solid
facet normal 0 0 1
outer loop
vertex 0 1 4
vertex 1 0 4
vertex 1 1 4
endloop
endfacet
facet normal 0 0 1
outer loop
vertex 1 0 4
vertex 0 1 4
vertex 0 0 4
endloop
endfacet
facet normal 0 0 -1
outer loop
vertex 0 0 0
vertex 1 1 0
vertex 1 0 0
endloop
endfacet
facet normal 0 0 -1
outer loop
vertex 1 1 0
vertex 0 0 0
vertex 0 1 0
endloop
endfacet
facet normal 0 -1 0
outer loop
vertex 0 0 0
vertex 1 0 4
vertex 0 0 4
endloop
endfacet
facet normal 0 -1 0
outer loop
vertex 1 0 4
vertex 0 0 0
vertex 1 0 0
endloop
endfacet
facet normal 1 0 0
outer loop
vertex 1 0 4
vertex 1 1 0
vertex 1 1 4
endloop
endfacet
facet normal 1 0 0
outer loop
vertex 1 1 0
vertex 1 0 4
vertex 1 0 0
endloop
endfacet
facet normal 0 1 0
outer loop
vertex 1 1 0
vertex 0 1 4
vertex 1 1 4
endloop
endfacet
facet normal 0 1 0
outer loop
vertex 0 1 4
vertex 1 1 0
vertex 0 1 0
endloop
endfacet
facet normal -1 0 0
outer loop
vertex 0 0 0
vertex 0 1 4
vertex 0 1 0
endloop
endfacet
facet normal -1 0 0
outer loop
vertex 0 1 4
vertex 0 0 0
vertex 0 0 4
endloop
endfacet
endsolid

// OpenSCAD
// file: ../../../src/common/common_params.scad
/***
 * @module Common Parameters
 * @brief Shared constants and tolerances used by the CurveGears implementation.
 *
 * Historical constants are retained for numerical compatibility.
 */
_cg_pi = 3.14159;
_cg_deg_per_rad = 57.29578;
_cg_tolerance = 1e-7;
_cg_default_fn = 50;
_cg_circle_pi = 3.141592653589793;

/**
 * @module _cg_assert_samples
 * @brief Validate a sampled-curve count while preserving the caller diagnostic.
 * @param samples {integer >= minimum} Requested sample count.
 * @param message {string} Caller-specific diagnostic message.
 * @param minimum {integer, default 120} Minimum supported sample count.
 */
module _cg_assert_samples(samples,message="samples must be an integer >= 120",minimum=120) {
    assert(samples >= minimum && floor(samples)==samples,message);
}
// file: ../../../src/common/common_math.scad
/***
 * @module Common Math
 * @brief Shared scalar, angle and vector helpers used by the geometry layers.
 *
 * These functions are internal implementation primitives and are not part of
 * the public family API.
 */
include <common_params.scad>

/*** @function _cg_degrees(angle)
 * @brief Convert radians to degrees.
 * @param angle {number} Angle in radians.
 * @return {number} Angle in degrees.
 */
function _cg_degrees(angle) = angle*_cg_deg_per_rad;
/*** @function _cg_radians(angle)
 * @brief Convert degrees to radians.
 * @param angle {number} Angle in degrees.
 * @return {number} Angle in radians.
 */
function _cg_radians(angle) = angle/_cg_deg_per_rad;
/*** @function _cg_polar(p)
 * @brief Convert a polar `[radius, angle]` pair to Cartesian coordinates.
 * @param p {array} Polar pair with angle in degrees.
 * @return {array} Cartesian point `[x, y]`.
 */
function _cg_polar(p) = [p[0]*cos(p[1]),p[0]*sin(p[1])];

/*** @function _cg_vsub(a, b)
 * @brief Subtract one two-dimensional vector from another.
 * @param a {array} Left-hand vector.
 * @param b {array} Right-hand vector.
 * @return {array} Difference vector.
 */
function _cg_vsub(a,b) = [a[0]-b[0], a[1]-b[1]];
/*** @function _cg_vlen(a)
 * @brief Calculate the Euclidean length of a two-dimensional vector.
 * @param a {array} Vector.
 * @return {number} Vector length.
 */
function _cg_vlen(a) = sqrt(a[0]*a[0] + a[1]*a[1]);
/*** @function _cg_vunit(a)
 * @brief Normalise a two-dimensional vector, returning zero for a zero vector.
 * @param a {array} Vector.
 * @return {array} Unit vector or `[0, 0]`.
 */
function _cg_vunit(a) = let(l=_cg_vlen(a)) l == 0 ? [0,0] : [a[0]/l,a[1]/l];
/*** @function _cg_lerp(a, b, t)
 * @brief Linearly interpolate between two scalar values.
 * @param a {number} Start value.
 * @param b {number} End value.
 * @param t {number} Interpolation fraction.
 * @return {number} Interpolated value.
 */
function _cg_lerp(a,b,t) = a + t*(b-a);
/*** @function _cg_vlerp(a, b, t)
 * @brief Linearly interpolate between two two-dimensional vectors.
 * @param a {array} Start vector.
 * @param b {array} End vector.
 * @param t {number} Interpolation fraction.
 * @return {array} Interpolated vector.
 */
function _cg_vlerp(a,b,t) = [_cg_lerp(a[0],b[0],t), _cg_lerp(a[1],b[1],t)];
/*** @function _cg_cross2(a, b)
 * @brief Calculate the scalar two-dimensional cross product.
 * @param a {array} First vector.
 * @param b {array} Second vector.
 * @return {number} Signed cross-product magnitude.
 */
function _cg_cross2(a,b) = a[0]*b[1]-a[1]*b[0];
/*** @function _cg_sum(v, i, acc)
 * @brief Sum a scalar array recursively.
 * @param v {array} Scalar values.
 * @param i {integer, default 0} Current index.
 * @param acc {number, default 0} Accumulated sum.
 * @return {number} Sum of the values.
 */
function _cg_sum(v,i=0,acc=0) = i >= len(v) ? acc : _cg_sum(v,i+1,acc+v[i]);
/*** @function _cg_prefix_sums(v, i, acc, out)
 * @brief Build inclusive prefix sums for a scalar array.
 * @param v {array} Scalar values.
 * @param i {integer, default 0} Current index.
 * @param acc {number, default 0} Accumulated sum.
 * @param out {array, default [0]} Prefix-sum output under construction.
 * @return {array} Prefix sums beginning with zero.
 */
function _cg_prefix_sums(v,i=0,acc=0,out=[0]) =
    i >= len(v) ? out : _cg_prefix_sums(v,i+1,acc+v[i],concat(out,[acc+v[i]]));

/*** @function _cg_closed_polyline_perimeter(points)
 * @brief Calculate the perimeter of a closed sampled point list.
 * @param points {array of points} Closed Cartesian polyline.
 * @return {number} Perimeter in the input coordinate units.
 */
function _cg_closed_polyline_perimeter(points) =
    _cg_sum([for(i=[0:len(points)-1])
        _cg_vlen(_cg_vsub(points[(i+1)%len(points)],points[i]))]);

/*** @function _cg_pitch_scale_from_points(modul, tooth_number, unit_points, circumference)
 * @brief Calculate pitch scaling from an existing unit-curve sample.
 * @param modul {number > 0} Tooth module in mm.
 * @param tooth_number {integer >= 3} Requested tooth count.
 * @param unit_points {array of points} Closed unit-curve sample.
 * @param circumference {number > 0, default _cg_pi} Family-selected circumference constant.
 * @return {number} Scale factor for the sampled unit curve.
 */
function _cg_pitch_scale_from_points(modul,tooth_number,unit_points,circumference=_cg_pi) =
    circumference*modul*tooth_number/_cg_closed_polyline_perimeter(unit_points);

/*** @function _cg_scale_points(scale, points)
 * @brief Multiply every sampled point by one scalar.
 * @param scale {number} Point scale factor.
 * @param points {array of points} Cartesian point list.
 * @return {array of points} Scaled Cartesian point list.
 */
function _cg_scale_points(scale,points) = [for(p=points) [scale*p[0],scale*p[1]]];

function _cg_upper_bound_column(tab,target,column,lo,hi) =
    lo>=hi ? max(0,lo) :
    let(mid=floor((lo+hi+1)/2))
    tab[mid][column] <= target
        ? _cg_upper_bound_column(tab,target,column,mid,hi)
        : _cg_upper_bound_column(tab,target,column,lo,mid-1);

/*** @function _cg_interp_x_for_y(tab, target, i)
 * @brief Interpolate an x value at a monotonic y target in a two-column table.
 * @param tab {array} Table of `[x, y]` samples.
 * @param target {number} Target y value.
 * @param i {integer, default 0} Search index.
 * @return {number} Interpolated x value.
 */
function _cg_interp_x_for_y(tab,target,i=0) =
    target < tab[0][1] ? tab[len(tab)-1][0] :
    let(segment=min(len(tab)-2,max(0,_cg_upper_bound_column(tab,target,1,0,len(tab)-1))),
        y0=tab[segment][1],y1=tab[segment+1][1])
    y1>y0 ? _cg_lerp(tab[segment][0],tab[segment+1][0],(target-y0)/(y1-y0)) :
    tab[len(tab)-1][0];

/*** @function _cg_interp_y_for_x(tab, target, i)
 * @brief Interpolate a y value at a monotonic x target in a two-column table.
 * @param tab {array} Table of `[x, y]` samples.
 * @param target {number} Target x value.
 * @param i {integer, default 0} Search index.
 * @return {number} Interpolated y value.
 */
function _cg_interp_y_for_x(tab,target,i=0) =
    target < tab[0][0] ? tab[len(tab)-1][1] :
    let(segment=min(len(tab)-2,max(0,_cg_upper_bound_column(tab,target,0,0,len(tab)-1))),
        x0=tab[segment][0],x1=tab[segment+1][0])
    x1>x0 ? _cg_lerp(tab[segment][1],tab[segment+1][1],(target-x0)/(x1-x0)) :
    tab[len(tab)-1][1];
/***
 * @module Mathematical References
 * @brief Mathematical sources used by the CurveGears families.
 * The ellipse uses the standard parametric ellipse. The lobed family uses a
 * sinusoidally modulated polar radius. The Pascal family uses Pascal's
 * limaçon. The logarithmic spiral follows the standard logarithmic spiral.
 * The epitrochoid follows the rolling-circle construction. The superformula
 * follows Johan Gielis, “A generic geometric transformation that unifies a
 * wide range of natural and abstract shapes”, American Journal of Botany
 * 90(3), 333–338 (2003), DOI 10.3732/ajb.90.3.333.
 * References: https://doi.org/10.3732/ajb.90.3.333
 * Pascal limaçon: https://mathworld.wolfram.com/Limacon.html
 * Logarithmic spiral: https://mathworld.wolfram.com/LogarithmicSpiral.html
 * Epitrochoid: https://mathworld.wolfram.com/Epitrochoid.html
 */
// main file
/***
 * @function tooth_placement_include
 * @brief Direct include smoke test for the standalone tooth-placement layer.
 * Source: [`tooth/placement/include.scad`](tooth/placement/include.scad)
 */
include <../../../src/common/tooth/placement.scad>

$fn=48;
modul=.8;
tooth_number=34;
pitch_radius=modul*tooth_number/2;
samples=48;
points=[for(i=[0:samples-1]) [pitch_radius*cos(360*i/samples),pitch_radius*sin(360*i/samples)]];
arc=_cg_polyline_arc_table(points);
perimeter=arc[len(arc)-1][1];
frame=_cg_local_frame_for_closed_arc(points,arc,perimeter,0);
assert(_cg_frame_valid(frame),str("standalone tooth placement frame failed: ",_cg_frame_failure_code(frame)));
assert(_cg_frame_continuity_failure_code(points,arc,perimeter,0,perimeter/tooth_number)=="PASS","standalone frame continuity failed");
cube([1,1,4]);
